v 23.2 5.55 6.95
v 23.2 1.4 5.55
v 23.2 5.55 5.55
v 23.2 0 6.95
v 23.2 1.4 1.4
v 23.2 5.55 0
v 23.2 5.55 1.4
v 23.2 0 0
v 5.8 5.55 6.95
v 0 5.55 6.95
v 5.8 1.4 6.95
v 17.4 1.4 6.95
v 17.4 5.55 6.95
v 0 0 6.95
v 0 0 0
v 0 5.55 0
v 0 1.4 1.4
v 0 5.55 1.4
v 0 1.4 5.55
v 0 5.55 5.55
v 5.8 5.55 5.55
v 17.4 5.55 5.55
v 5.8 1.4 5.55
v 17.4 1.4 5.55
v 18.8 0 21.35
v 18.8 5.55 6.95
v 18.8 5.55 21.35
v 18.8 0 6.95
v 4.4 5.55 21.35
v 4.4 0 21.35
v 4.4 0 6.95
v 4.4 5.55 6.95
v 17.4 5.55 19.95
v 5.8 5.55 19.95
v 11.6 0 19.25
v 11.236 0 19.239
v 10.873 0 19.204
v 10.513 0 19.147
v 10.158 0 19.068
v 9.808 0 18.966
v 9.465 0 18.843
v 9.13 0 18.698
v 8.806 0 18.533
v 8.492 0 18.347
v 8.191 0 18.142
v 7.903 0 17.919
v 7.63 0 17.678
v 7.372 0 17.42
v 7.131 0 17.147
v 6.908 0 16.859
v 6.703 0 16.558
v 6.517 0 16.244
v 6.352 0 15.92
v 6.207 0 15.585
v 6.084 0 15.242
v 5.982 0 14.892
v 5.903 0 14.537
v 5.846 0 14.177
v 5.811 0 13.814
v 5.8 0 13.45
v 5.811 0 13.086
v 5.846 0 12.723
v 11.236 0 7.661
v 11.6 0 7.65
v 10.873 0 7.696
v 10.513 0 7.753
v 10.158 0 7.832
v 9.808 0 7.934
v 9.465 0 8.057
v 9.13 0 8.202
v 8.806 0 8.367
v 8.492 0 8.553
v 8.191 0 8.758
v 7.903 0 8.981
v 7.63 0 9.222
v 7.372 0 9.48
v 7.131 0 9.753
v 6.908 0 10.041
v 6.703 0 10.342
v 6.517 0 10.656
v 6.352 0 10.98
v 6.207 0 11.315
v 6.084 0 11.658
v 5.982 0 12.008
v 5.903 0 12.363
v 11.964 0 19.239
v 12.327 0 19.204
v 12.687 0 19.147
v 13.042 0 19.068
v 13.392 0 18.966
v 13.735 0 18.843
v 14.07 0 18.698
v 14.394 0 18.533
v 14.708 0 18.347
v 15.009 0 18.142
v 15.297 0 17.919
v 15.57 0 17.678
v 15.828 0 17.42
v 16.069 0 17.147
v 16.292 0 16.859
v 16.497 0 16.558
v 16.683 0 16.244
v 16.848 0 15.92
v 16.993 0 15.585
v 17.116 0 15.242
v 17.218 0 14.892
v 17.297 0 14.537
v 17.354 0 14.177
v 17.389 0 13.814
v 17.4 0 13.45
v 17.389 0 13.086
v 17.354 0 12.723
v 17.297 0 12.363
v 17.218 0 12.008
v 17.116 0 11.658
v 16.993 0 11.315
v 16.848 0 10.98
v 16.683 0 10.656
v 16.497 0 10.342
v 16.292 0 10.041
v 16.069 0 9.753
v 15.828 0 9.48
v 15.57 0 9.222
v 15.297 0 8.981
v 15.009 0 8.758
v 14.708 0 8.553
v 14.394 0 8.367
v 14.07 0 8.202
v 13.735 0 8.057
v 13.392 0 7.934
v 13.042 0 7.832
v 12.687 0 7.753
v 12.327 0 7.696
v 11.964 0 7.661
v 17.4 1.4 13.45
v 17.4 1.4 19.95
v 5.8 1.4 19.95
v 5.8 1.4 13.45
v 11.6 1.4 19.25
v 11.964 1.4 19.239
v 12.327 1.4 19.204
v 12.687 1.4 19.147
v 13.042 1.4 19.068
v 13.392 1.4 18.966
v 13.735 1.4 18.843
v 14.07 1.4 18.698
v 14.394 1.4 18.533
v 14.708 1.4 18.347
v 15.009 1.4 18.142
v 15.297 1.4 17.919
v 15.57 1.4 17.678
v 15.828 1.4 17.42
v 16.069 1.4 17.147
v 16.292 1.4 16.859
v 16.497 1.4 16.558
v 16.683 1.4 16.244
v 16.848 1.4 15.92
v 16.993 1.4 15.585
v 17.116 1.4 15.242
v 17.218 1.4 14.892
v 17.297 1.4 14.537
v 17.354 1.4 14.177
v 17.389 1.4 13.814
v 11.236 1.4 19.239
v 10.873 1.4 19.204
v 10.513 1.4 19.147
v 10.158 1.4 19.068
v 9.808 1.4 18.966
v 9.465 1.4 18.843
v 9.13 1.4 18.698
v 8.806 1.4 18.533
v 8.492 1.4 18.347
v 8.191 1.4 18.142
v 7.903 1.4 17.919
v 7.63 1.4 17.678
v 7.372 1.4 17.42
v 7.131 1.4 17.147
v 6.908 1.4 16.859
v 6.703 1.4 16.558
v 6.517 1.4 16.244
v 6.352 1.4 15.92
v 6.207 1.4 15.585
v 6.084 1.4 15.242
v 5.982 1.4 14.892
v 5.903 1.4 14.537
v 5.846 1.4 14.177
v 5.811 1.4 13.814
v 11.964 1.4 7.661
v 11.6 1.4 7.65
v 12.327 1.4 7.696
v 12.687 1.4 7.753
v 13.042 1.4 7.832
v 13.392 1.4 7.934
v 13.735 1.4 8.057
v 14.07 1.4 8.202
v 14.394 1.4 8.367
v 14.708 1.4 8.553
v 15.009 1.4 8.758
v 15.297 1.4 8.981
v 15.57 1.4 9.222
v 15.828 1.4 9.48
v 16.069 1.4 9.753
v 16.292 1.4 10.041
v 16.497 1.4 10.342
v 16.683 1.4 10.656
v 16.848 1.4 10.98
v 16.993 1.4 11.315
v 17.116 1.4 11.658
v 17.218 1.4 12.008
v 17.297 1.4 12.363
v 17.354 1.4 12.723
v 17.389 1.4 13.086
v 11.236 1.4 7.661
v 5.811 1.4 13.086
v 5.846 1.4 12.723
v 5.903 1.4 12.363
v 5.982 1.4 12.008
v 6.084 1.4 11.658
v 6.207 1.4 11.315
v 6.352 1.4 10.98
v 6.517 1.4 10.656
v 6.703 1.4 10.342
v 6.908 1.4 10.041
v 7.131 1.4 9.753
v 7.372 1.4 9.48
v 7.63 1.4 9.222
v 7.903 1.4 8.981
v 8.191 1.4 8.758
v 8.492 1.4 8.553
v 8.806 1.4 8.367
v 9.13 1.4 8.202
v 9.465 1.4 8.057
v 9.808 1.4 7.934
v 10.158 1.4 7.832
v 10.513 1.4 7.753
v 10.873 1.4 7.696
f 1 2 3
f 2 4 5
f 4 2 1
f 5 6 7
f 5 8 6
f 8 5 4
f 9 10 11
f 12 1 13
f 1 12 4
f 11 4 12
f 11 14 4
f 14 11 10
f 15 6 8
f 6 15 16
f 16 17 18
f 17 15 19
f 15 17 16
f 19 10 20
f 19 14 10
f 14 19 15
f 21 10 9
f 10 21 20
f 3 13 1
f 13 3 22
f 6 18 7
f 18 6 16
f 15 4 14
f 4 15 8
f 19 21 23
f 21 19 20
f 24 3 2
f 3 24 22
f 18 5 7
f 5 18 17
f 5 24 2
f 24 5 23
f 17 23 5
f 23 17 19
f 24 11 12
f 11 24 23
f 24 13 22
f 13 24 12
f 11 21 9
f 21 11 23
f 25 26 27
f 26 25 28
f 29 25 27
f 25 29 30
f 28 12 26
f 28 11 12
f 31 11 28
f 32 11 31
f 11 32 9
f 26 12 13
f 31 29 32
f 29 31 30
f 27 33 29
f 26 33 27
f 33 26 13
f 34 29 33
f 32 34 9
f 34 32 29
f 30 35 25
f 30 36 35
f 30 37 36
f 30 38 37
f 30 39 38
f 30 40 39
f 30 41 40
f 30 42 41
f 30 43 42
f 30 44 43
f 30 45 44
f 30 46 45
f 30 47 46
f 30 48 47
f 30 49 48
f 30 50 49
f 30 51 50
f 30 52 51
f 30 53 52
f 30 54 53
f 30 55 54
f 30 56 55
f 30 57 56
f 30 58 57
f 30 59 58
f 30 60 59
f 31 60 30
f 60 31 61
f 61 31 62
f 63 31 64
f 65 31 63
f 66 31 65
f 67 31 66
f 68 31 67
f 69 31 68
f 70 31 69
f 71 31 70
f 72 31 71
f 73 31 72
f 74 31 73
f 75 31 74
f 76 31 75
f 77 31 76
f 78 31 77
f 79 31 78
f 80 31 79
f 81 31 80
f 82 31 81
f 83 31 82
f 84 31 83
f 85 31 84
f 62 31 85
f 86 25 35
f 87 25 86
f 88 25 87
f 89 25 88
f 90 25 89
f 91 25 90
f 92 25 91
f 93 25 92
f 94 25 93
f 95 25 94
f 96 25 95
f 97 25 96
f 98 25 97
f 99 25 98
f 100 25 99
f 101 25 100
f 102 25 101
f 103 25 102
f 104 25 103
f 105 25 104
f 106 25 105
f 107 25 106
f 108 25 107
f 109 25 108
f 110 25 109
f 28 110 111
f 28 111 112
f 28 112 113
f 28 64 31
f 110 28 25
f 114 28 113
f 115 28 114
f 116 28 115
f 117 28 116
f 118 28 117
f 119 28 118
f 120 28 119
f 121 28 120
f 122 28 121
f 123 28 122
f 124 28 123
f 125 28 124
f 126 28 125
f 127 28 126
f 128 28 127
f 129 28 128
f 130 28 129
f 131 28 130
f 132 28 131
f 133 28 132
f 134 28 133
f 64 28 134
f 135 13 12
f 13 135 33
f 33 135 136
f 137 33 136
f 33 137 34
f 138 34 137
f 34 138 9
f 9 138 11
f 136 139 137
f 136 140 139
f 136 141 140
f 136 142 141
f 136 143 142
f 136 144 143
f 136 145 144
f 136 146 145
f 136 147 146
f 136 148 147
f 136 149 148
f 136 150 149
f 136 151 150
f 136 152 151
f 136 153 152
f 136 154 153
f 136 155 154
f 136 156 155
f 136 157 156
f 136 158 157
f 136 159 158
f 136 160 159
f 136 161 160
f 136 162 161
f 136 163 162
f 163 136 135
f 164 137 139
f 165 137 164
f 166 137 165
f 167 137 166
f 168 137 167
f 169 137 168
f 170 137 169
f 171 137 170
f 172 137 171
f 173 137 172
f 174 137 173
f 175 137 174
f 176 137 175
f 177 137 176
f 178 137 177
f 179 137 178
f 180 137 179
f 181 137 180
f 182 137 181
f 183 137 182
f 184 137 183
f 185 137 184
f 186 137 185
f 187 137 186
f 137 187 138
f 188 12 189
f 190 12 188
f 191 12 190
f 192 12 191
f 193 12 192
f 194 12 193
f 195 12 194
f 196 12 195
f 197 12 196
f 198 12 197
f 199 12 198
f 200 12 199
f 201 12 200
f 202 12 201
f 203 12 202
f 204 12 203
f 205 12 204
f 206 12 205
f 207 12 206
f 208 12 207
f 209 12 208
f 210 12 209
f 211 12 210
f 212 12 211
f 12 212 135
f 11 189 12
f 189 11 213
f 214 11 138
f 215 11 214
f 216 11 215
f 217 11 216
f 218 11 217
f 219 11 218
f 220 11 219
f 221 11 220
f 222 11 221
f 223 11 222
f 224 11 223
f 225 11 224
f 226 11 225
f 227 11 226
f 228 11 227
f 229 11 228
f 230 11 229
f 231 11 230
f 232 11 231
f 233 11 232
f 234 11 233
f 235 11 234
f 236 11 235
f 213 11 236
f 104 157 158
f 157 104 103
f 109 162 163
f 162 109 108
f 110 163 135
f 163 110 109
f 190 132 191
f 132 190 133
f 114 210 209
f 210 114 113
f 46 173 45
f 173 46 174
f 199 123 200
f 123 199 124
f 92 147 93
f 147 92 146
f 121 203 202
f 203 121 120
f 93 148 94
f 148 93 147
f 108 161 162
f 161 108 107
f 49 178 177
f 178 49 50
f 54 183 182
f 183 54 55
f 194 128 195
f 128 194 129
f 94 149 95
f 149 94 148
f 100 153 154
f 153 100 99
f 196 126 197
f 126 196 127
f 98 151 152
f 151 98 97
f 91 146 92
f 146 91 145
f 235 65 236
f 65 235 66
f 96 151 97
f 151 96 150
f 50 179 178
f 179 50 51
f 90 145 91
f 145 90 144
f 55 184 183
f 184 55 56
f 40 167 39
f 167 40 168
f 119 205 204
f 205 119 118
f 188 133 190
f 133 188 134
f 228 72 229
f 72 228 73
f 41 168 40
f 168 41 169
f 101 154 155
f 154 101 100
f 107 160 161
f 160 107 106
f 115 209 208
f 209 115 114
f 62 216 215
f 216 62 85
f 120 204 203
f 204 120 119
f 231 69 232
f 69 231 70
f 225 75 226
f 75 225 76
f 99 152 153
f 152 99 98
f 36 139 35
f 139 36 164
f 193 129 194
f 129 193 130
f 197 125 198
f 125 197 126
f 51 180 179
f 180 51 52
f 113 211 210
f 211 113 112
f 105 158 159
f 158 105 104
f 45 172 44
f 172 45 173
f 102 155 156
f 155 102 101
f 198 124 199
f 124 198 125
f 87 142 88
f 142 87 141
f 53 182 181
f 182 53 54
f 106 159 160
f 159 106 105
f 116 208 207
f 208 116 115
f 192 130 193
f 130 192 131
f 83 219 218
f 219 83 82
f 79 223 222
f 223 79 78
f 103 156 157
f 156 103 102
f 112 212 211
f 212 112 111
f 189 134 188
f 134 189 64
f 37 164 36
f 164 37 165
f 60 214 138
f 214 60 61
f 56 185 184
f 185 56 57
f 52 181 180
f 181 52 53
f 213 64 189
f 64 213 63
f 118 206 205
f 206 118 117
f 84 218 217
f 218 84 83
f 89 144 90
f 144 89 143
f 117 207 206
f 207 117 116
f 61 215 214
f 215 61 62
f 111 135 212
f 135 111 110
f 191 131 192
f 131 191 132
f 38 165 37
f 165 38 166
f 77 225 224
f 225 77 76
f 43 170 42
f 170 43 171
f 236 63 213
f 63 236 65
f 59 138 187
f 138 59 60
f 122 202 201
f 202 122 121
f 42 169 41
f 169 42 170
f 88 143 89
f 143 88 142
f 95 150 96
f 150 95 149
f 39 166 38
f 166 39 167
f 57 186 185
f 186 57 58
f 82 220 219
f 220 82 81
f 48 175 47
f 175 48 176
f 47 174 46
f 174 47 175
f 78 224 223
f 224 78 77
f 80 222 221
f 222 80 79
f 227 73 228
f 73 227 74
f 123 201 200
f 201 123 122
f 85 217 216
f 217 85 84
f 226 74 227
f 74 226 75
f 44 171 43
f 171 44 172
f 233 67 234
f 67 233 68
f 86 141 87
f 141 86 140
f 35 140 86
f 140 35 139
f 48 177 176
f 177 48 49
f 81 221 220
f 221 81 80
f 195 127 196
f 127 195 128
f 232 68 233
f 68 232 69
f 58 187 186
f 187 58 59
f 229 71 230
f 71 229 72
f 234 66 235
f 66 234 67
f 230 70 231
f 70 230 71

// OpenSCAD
switch_width = 11.6;
switch_height = 13;
beam_depth = 4.15;
beam_height = 4.15;
thickness = 1.4;

brace_width = switch_width * 2;

difference() {
  cube([brace_width, beam_depth + thickness, beam_height + 2 * thickness]);
  translate([0, thickness, thickness]) {
    cube([brace_width, beam_depth, beam_height]);
  }
  translate([(brace_width - switch_width) / 2, thickness, beam_height + thickness]) {
    cube([switch_width, beam_depth, beam_depth]);
  }
}

translate([(brace_width - switch_width) / 2 - thickness, 0, beam_height + 2 * thickness]) {
  difference() {
    cube([switch_width + 2 * thickness, beam_depth + thickness, switch_height + thickness]);
    translate([thickness, thickness, 0]) {
      cube([switch_width, beam_depth, switch_height]);
    }
    translate([thickness + switch_width / 2, thickness, switch_height / 2]) {
      rotate([90]) {
        cylinder(h = thickness, d = switch_width < switch_height ? switch_width : switch_height, $fn = 100);
      }
    }
  }
}
